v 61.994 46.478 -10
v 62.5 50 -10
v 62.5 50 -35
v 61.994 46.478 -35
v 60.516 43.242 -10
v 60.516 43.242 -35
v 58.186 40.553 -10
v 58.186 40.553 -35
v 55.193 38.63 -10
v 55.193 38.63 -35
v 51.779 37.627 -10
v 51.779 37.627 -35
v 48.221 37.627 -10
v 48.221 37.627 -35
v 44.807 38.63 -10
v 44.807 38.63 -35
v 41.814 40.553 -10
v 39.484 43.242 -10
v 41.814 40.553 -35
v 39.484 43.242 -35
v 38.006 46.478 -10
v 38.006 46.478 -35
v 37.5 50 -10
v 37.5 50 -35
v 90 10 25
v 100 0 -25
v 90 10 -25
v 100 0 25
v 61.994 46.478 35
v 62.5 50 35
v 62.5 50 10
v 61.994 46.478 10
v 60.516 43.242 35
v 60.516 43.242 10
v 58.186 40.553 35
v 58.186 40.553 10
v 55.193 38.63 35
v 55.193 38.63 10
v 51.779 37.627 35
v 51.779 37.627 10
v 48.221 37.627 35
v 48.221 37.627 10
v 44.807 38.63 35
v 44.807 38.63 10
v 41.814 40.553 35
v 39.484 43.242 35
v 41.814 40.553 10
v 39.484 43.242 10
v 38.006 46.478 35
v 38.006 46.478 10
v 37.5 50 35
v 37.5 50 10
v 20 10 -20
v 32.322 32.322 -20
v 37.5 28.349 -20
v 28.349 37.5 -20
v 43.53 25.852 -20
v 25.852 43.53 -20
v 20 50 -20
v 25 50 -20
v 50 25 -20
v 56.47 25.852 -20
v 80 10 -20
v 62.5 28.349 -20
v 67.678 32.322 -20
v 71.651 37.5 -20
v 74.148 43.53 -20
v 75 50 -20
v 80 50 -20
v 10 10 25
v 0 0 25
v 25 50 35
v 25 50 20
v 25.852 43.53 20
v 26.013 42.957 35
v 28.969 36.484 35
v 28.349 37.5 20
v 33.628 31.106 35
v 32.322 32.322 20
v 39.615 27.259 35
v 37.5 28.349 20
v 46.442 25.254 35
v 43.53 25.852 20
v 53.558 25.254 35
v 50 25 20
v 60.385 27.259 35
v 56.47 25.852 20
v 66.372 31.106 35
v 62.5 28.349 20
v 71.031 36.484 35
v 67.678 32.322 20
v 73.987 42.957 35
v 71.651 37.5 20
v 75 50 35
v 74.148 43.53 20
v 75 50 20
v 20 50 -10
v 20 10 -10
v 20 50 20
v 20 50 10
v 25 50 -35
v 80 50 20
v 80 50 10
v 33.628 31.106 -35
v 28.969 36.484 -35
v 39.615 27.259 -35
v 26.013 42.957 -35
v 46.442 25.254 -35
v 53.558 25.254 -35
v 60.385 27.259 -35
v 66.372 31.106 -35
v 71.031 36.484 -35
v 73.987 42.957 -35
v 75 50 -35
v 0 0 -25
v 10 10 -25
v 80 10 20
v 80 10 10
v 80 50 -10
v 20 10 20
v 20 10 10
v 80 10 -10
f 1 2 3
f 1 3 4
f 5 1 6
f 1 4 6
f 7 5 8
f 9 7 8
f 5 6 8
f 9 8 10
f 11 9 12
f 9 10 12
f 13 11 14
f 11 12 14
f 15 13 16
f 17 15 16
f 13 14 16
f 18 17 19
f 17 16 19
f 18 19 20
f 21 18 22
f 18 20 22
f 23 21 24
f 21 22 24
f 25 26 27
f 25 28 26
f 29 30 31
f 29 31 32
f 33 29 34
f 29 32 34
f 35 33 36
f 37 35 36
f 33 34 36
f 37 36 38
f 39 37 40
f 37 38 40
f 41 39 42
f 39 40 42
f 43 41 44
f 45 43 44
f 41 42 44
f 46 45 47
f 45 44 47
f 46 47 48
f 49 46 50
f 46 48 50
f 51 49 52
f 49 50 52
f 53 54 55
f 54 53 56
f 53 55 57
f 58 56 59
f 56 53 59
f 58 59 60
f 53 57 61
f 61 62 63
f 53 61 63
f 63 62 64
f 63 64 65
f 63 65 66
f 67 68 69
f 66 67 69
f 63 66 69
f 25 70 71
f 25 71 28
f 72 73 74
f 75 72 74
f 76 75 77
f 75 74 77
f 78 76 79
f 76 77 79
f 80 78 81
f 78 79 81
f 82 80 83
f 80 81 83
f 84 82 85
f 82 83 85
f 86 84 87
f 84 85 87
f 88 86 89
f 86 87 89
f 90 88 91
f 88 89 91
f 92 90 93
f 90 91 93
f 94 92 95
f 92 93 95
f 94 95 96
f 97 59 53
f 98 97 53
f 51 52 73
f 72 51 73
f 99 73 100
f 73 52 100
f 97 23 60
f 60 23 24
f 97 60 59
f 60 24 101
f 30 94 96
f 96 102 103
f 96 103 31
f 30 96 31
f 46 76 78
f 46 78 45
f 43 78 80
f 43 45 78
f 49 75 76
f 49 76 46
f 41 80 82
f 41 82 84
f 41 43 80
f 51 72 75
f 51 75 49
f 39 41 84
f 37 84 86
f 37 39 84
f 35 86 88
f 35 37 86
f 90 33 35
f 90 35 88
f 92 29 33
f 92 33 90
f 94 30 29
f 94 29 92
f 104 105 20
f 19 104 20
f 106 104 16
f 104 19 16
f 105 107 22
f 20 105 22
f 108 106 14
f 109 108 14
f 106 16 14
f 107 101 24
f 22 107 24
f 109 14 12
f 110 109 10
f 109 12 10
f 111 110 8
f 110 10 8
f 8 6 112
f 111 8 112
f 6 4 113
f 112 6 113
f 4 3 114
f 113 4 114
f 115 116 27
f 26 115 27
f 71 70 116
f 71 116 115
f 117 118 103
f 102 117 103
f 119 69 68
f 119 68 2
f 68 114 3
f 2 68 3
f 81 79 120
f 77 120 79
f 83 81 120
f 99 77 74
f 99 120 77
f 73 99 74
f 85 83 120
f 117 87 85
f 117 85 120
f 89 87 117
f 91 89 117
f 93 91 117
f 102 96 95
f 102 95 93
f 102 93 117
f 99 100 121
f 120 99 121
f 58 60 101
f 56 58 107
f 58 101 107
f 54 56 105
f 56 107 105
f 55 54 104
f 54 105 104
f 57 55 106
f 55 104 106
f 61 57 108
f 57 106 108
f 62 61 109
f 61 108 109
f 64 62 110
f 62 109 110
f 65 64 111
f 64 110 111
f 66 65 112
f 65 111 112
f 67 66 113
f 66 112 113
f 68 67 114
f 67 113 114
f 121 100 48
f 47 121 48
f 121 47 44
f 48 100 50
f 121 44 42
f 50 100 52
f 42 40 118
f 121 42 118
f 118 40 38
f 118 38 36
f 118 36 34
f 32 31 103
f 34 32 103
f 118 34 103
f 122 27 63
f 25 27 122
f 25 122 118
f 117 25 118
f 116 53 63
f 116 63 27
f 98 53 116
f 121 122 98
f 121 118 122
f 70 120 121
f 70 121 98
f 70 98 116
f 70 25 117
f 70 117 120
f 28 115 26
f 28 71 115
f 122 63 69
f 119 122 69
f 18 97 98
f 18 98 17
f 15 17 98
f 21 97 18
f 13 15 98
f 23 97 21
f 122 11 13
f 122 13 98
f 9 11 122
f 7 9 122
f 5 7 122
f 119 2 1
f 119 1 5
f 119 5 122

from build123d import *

# Parameters (mm, degrees)
BOSS_EXTRUDE1_DEPTH = 25
BOSS_EXTRUDE2_START = 10
BOSS_EXTRUDE2_DEPTH = 10
BOSS_EXTRUDE3_START = -20
BOSS_EXTRUDE3_DEPTH = 10
BOSS_EXTRUDE4_START = -35
BOSS_EXTRUDE4_DEPTH = 25
BOSS_EXTRUDE5_START = 10
BOSS_EXTRUDE5_DEPTH = 25


with BuildPart() as part:
    # Sketch1 → Boss-Extrude1 (new, symmetric)
    with BuildSketch(Plane.XY):
        Polygon((50, 10), (50, 0), (100, 0), (90, 10), (80, 10), align=None)
        Polygon((10, 10), (0, 0), (50, 0), (50, 10), (20, 10), align=None)
    extrude(amount=BOSS_EXTRUDE1_DEPTH, both=True)

    # Sketch1<3> → Boss-Extrude2 (add)
    with BuildSketch(Plane.XY.offset(BOSS_EXTRUDE2_START)):
        with BuildLine():
            Line((50, 25), (50, 10))
            Line((50, 10), (80, 10))
            Line((80, 10), (80, 50))
            Line((80, 50), (75, 50))
            ThreePointArc((75, 50), (67.67766953, 32.32233047), (50, 25))
        make_face()
        with BuildLine():
            Line((20, 10), (50, 10))
            Line((50, 10), (50, 25))
            ThreePointArc((50, 25), (32.32233047, 32.32233047), (25, 50))
            Line((25, 50), (20, 50))
            Line((20, 50), (20, 10))
        make_face()
    extrude(amount=BOSS_EXTRUDE2_DEPTH)

    # Sketch1<4> → Boss-Extrude3 (add)
    with BuildSketch(Plane.XY.offset(BOSS_EXTRUDE3_START)):
        with BuildLine():
            Line((50, 25), (50, 10))
            Line((50, 10), (80, 10))
            Line((80, 10), (80, 50))
            Line((80, 50), (75, 50))
            ThreePointArc((75, 50), (67.67766953, 32.32233047), (50, 25))
        make_face()
        with BuildLine():
            Line((20, 10), (50, 10))
            Line((50, 10), (50, 25))
            ThreePointArc((50, 25), (32.32233047, 32.32233047), (25, 50))
            Line((25, 50), (20, 50))
            Line((20, 50), (20, 10))
        make_face()
    extrude(amount=BOSS_EXTRUDE3_DEPTH)

    # Sketch1<5> → Boss-Extrude4 (add)
    with BuildSketch(Plane.XY.offset(BOSS_EXTRUDE4_START)):
        with BuildLine():
            Line((37.5, 50), (25, 50))
            ThreePointArc((25, 50), (50, 25), (75, 50))
            Line((75, 50), (62.5, 50))
            ThreePointArc((62.5, 50), (50, 37.5), (37.5, 50))
        make_face()
    extrude(amount=BOSS_EXTRUDE4_DEPTH)

    # Sketch1<6> → Boss-Extrude5 (add)
    with BuildSketch(Plane.XY.offset(BOSS_EXTRUDE5_START)):
        with BuildLine():
            Line((37.5, 50), (25, 50))
            ThreePointArc((25, 50), (50, 25), (75, 50))
            Line((75, 50), (62.5, 50))
            ThreePointArc((62.5, 50), (50, 37.5), (37.5, 50))
        make_face()
    extrude(amount=BOSS_EXTRUDE5_DEPTH)


solid = part.part
